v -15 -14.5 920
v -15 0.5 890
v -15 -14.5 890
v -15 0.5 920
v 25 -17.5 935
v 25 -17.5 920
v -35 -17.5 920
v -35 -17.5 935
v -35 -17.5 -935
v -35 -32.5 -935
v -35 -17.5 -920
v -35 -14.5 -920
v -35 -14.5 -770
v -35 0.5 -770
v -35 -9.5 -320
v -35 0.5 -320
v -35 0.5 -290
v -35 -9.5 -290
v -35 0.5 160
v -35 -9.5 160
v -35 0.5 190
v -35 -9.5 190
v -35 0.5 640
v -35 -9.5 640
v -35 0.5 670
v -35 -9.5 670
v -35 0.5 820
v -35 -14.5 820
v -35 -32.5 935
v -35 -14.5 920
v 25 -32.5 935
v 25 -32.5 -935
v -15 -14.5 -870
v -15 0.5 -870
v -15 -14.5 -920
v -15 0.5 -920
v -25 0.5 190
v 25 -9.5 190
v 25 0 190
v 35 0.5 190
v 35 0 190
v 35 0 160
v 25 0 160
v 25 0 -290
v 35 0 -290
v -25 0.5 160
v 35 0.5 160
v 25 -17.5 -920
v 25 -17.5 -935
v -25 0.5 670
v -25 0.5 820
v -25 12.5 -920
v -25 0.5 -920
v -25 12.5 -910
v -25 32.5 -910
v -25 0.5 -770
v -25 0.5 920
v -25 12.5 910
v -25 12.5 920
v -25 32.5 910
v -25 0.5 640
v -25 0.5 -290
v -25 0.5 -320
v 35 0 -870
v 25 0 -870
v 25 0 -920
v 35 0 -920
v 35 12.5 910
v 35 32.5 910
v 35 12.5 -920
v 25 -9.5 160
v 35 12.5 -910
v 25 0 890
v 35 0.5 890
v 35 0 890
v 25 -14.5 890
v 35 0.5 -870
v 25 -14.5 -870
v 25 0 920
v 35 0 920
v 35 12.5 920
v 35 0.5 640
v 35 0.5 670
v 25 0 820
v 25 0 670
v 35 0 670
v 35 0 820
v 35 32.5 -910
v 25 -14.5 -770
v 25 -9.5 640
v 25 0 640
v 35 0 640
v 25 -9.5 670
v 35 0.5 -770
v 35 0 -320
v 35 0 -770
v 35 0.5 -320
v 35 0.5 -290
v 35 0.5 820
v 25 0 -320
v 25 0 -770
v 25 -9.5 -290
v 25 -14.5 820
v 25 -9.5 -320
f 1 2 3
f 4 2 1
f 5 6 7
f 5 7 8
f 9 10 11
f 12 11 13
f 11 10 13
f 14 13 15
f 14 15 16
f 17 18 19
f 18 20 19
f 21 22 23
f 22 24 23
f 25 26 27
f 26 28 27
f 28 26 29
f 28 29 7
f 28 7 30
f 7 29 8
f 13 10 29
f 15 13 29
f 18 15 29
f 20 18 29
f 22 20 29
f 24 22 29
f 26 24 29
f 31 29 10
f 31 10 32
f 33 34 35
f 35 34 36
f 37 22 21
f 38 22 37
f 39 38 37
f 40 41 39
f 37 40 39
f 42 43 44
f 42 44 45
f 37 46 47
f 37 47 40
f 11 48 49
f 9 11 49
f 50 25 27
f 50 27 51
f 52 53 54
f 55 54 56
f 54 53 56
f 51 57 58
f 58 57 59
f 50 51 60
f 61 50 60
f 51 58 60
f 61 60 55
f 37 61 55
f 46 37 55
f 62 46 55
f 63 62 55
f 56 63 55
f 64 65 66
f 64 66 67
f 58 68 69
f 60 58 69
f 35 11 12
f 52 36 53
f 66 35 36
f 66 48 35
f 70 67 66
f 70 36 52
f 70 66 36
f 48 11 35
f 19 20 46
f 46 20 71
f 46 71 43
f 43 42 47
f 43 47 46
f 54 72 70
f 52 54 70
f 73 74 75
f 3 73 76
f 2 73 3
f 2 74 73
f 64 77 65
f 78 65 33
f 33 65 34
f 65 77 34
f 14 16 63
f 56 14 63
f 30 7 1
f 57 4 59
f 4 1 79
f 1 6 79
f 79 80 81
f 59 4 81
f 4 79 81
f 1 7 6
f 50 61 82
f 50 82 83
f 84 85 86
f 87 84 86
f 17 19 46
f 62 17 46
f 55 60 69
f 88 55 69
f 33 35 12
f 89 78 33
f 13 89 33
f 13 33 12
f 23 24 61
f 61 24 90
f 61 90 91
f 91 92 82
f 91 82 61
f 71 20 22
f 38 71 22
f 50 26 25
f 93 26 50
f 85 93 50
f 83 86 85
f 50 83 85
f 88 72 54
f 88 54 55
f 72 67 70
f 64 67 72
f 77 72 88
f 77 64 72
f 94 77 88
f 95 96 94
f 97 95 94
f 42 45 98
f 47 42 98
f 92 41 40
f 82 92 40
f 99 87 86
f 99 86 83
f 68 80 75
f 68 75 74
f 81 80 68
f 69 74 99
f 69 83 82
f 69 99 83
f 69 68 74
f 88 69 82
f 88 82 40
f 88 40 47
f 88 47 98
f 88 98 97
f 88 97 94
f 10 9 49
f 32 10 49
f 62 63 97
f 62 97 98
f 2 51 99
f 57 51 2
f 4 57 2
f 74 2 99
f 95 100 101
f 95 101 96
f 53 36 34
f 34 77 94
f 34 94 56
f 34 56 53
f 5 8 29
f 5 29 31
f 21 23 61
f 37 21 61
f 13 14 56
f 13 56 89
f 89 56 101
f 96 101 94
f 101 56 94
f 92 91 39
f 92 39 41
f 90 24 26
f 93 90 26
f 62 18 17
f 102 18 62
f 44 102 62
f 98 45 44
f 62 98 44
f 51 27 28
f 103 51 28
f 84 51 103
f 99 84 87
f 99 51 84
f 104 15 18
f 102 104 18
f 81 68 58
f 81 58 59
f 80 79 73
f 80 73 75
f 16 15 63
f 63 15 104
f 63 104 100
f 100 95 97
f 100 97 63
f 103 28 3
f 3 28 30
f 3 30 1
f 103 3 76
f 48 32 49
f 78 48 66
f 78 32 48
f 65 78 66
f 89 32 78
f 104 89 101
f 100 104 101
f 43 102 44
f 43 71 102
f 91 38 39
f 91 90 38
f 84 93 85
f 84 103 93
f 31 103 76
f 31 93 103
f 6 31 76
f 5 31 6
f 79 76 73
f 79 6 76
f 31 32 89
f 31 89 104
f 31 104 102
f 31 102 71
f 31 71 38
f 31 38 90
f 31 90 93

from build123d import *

# Parameters (mm, degrees)
SKETCH022_W     = 70
SKETCH022_H     = 65
PAD002_DEPTH    = 1870
POCKET024_DEPTH = 15
POCKET026_DEPTH = 15
SKETCH023_W     = 10
SKETCH023_H     = 30
POCKET019_DEPTH = 70.001
SKETCH024_W     = 20
SKETCH024_H     = 25
POCKET020_DEPTH = 3814.8775
SKETCH025_W     = 50
SKETCH025_H     = 15
POCKET021_DEPTH = 3814.8775
SKETCH029_W     = 10
SKETCH029_H     = 32
POCKET025_DEPTH = 1870.001
SKETCH031_W     = 10
SKETCH031_H     = 32.5
POCKET027_DEPTH = 1870.001


with BuildPart() as part:
    # Sketch022 (on DatumPlane) → Pad002 (new body)
    with BuildSketch(Plane.XY.offset(935)):
        Rectangle(SKETCH022_W, SKETCH022_H)
    extrude(amount=-PAD002_DEPTH)

    # Sketch028 (on DatumPlane) → Pocket024 (cut)
    with BuildSketch(Plane(origin=(0, 0.5, 0), x_dir=(-1, 0, 0), z_dir=(0, 1, 0))):
        Polygon((-35, 890), (15, 890), (15, 935), (35, 935), (35, 820), (-35, 820), align=None)
    extrude(amount=-POCKET024_DEPTH, mode=Mode.SUBTRACT)

    # Sketch030 (on DatumPlane) → Pocket026 (cut)
    with BuildSketch(Plane(origin=(0, 0.5, 0), x_dir=(-1, 0, 0), z_dir=(0, 1, 0))):
        Polygon((35, -770), (-35, -770), (-35, -870), (15, -870), (15, -935), (35, -935), align=None)
    extrude(amount=-POCKET026_DEPTH, mode=Mode.SUBTRACT)

    # Sketch023 (on DatumPlane) → Pocket019 (cut, through all)
    with BuildSketch(Plane.YZ.offset(35)):
        with Locations((-4.5, -305)):
            Rectangle(SKETCH023_W, SKETCH023_H)
        with Locations((-4.5, 175)):
            Rectangle(SKETCH023_W, SKETCH023_H)
        with Locations((-4.5, 655)):
            Rectangle(SKETCH023_W, SKETCH023_H)
    extrude(amount=-POCKET019_DEPTH, mode=Mode.SUBTRACT)

    # Sketch024 (on DatumPlane) → Pocket020 (cut, through all)
    with BuildSketch(Plane.YZ.offset(35)):
        with Locations((22.5, 922.5)):
            Rectangle(SKETCH024_W, SKETCH024_H)
    pocket020 = extrude(amount=-POCKET020_DEPTH, mode=Mode.SUBTRACT)

    # Sketch025 (on DatumPlane) → Pocket021 (cut, through all)
    with BuildSketch(Plane.YZ.offset(35)):
        with Locations((7.5, 927.5)):
            Rectangle(SKETCH025_W, SKETCH025_H)
    pocket021 = extrude(amount=-POCKET021_DEPTH, mode=Mode.SUBTRACT)

    # Mirrored003: Pocket020, Pocket021 across XY
    add(pocket020.mirror(Plane.XY), mode=Mode.SUBTRACT)
    add(pocket021.mirror(Plane.XY), mode=Mode.SUBTRACT)

    # Sketch029 (on DatumPlane) → Pocket025 (cut, through all)
    with BuildSketch(Plane.XY.offset(935)):
        with Locations((-30, 16.5)):
            Rectangle(SKETCH029_W, SKETCH029_H)
    extrude(amount=-POCKET025_DEPTH, mode=Mode.SUBTRACT)

    # Sketch031 (on DatumPlane) → Pocket027 (cut, through all)
    with BuildSketch(Plane.XY.offset(935)):
        with Locations((30, -16.25)):
            Rectangle(SKETCH031_W, SKETCH031_H)
    extrude(amount=-POCKET027_DEPTH, mode=Mode.SUBTRACT)


solid = part.part
